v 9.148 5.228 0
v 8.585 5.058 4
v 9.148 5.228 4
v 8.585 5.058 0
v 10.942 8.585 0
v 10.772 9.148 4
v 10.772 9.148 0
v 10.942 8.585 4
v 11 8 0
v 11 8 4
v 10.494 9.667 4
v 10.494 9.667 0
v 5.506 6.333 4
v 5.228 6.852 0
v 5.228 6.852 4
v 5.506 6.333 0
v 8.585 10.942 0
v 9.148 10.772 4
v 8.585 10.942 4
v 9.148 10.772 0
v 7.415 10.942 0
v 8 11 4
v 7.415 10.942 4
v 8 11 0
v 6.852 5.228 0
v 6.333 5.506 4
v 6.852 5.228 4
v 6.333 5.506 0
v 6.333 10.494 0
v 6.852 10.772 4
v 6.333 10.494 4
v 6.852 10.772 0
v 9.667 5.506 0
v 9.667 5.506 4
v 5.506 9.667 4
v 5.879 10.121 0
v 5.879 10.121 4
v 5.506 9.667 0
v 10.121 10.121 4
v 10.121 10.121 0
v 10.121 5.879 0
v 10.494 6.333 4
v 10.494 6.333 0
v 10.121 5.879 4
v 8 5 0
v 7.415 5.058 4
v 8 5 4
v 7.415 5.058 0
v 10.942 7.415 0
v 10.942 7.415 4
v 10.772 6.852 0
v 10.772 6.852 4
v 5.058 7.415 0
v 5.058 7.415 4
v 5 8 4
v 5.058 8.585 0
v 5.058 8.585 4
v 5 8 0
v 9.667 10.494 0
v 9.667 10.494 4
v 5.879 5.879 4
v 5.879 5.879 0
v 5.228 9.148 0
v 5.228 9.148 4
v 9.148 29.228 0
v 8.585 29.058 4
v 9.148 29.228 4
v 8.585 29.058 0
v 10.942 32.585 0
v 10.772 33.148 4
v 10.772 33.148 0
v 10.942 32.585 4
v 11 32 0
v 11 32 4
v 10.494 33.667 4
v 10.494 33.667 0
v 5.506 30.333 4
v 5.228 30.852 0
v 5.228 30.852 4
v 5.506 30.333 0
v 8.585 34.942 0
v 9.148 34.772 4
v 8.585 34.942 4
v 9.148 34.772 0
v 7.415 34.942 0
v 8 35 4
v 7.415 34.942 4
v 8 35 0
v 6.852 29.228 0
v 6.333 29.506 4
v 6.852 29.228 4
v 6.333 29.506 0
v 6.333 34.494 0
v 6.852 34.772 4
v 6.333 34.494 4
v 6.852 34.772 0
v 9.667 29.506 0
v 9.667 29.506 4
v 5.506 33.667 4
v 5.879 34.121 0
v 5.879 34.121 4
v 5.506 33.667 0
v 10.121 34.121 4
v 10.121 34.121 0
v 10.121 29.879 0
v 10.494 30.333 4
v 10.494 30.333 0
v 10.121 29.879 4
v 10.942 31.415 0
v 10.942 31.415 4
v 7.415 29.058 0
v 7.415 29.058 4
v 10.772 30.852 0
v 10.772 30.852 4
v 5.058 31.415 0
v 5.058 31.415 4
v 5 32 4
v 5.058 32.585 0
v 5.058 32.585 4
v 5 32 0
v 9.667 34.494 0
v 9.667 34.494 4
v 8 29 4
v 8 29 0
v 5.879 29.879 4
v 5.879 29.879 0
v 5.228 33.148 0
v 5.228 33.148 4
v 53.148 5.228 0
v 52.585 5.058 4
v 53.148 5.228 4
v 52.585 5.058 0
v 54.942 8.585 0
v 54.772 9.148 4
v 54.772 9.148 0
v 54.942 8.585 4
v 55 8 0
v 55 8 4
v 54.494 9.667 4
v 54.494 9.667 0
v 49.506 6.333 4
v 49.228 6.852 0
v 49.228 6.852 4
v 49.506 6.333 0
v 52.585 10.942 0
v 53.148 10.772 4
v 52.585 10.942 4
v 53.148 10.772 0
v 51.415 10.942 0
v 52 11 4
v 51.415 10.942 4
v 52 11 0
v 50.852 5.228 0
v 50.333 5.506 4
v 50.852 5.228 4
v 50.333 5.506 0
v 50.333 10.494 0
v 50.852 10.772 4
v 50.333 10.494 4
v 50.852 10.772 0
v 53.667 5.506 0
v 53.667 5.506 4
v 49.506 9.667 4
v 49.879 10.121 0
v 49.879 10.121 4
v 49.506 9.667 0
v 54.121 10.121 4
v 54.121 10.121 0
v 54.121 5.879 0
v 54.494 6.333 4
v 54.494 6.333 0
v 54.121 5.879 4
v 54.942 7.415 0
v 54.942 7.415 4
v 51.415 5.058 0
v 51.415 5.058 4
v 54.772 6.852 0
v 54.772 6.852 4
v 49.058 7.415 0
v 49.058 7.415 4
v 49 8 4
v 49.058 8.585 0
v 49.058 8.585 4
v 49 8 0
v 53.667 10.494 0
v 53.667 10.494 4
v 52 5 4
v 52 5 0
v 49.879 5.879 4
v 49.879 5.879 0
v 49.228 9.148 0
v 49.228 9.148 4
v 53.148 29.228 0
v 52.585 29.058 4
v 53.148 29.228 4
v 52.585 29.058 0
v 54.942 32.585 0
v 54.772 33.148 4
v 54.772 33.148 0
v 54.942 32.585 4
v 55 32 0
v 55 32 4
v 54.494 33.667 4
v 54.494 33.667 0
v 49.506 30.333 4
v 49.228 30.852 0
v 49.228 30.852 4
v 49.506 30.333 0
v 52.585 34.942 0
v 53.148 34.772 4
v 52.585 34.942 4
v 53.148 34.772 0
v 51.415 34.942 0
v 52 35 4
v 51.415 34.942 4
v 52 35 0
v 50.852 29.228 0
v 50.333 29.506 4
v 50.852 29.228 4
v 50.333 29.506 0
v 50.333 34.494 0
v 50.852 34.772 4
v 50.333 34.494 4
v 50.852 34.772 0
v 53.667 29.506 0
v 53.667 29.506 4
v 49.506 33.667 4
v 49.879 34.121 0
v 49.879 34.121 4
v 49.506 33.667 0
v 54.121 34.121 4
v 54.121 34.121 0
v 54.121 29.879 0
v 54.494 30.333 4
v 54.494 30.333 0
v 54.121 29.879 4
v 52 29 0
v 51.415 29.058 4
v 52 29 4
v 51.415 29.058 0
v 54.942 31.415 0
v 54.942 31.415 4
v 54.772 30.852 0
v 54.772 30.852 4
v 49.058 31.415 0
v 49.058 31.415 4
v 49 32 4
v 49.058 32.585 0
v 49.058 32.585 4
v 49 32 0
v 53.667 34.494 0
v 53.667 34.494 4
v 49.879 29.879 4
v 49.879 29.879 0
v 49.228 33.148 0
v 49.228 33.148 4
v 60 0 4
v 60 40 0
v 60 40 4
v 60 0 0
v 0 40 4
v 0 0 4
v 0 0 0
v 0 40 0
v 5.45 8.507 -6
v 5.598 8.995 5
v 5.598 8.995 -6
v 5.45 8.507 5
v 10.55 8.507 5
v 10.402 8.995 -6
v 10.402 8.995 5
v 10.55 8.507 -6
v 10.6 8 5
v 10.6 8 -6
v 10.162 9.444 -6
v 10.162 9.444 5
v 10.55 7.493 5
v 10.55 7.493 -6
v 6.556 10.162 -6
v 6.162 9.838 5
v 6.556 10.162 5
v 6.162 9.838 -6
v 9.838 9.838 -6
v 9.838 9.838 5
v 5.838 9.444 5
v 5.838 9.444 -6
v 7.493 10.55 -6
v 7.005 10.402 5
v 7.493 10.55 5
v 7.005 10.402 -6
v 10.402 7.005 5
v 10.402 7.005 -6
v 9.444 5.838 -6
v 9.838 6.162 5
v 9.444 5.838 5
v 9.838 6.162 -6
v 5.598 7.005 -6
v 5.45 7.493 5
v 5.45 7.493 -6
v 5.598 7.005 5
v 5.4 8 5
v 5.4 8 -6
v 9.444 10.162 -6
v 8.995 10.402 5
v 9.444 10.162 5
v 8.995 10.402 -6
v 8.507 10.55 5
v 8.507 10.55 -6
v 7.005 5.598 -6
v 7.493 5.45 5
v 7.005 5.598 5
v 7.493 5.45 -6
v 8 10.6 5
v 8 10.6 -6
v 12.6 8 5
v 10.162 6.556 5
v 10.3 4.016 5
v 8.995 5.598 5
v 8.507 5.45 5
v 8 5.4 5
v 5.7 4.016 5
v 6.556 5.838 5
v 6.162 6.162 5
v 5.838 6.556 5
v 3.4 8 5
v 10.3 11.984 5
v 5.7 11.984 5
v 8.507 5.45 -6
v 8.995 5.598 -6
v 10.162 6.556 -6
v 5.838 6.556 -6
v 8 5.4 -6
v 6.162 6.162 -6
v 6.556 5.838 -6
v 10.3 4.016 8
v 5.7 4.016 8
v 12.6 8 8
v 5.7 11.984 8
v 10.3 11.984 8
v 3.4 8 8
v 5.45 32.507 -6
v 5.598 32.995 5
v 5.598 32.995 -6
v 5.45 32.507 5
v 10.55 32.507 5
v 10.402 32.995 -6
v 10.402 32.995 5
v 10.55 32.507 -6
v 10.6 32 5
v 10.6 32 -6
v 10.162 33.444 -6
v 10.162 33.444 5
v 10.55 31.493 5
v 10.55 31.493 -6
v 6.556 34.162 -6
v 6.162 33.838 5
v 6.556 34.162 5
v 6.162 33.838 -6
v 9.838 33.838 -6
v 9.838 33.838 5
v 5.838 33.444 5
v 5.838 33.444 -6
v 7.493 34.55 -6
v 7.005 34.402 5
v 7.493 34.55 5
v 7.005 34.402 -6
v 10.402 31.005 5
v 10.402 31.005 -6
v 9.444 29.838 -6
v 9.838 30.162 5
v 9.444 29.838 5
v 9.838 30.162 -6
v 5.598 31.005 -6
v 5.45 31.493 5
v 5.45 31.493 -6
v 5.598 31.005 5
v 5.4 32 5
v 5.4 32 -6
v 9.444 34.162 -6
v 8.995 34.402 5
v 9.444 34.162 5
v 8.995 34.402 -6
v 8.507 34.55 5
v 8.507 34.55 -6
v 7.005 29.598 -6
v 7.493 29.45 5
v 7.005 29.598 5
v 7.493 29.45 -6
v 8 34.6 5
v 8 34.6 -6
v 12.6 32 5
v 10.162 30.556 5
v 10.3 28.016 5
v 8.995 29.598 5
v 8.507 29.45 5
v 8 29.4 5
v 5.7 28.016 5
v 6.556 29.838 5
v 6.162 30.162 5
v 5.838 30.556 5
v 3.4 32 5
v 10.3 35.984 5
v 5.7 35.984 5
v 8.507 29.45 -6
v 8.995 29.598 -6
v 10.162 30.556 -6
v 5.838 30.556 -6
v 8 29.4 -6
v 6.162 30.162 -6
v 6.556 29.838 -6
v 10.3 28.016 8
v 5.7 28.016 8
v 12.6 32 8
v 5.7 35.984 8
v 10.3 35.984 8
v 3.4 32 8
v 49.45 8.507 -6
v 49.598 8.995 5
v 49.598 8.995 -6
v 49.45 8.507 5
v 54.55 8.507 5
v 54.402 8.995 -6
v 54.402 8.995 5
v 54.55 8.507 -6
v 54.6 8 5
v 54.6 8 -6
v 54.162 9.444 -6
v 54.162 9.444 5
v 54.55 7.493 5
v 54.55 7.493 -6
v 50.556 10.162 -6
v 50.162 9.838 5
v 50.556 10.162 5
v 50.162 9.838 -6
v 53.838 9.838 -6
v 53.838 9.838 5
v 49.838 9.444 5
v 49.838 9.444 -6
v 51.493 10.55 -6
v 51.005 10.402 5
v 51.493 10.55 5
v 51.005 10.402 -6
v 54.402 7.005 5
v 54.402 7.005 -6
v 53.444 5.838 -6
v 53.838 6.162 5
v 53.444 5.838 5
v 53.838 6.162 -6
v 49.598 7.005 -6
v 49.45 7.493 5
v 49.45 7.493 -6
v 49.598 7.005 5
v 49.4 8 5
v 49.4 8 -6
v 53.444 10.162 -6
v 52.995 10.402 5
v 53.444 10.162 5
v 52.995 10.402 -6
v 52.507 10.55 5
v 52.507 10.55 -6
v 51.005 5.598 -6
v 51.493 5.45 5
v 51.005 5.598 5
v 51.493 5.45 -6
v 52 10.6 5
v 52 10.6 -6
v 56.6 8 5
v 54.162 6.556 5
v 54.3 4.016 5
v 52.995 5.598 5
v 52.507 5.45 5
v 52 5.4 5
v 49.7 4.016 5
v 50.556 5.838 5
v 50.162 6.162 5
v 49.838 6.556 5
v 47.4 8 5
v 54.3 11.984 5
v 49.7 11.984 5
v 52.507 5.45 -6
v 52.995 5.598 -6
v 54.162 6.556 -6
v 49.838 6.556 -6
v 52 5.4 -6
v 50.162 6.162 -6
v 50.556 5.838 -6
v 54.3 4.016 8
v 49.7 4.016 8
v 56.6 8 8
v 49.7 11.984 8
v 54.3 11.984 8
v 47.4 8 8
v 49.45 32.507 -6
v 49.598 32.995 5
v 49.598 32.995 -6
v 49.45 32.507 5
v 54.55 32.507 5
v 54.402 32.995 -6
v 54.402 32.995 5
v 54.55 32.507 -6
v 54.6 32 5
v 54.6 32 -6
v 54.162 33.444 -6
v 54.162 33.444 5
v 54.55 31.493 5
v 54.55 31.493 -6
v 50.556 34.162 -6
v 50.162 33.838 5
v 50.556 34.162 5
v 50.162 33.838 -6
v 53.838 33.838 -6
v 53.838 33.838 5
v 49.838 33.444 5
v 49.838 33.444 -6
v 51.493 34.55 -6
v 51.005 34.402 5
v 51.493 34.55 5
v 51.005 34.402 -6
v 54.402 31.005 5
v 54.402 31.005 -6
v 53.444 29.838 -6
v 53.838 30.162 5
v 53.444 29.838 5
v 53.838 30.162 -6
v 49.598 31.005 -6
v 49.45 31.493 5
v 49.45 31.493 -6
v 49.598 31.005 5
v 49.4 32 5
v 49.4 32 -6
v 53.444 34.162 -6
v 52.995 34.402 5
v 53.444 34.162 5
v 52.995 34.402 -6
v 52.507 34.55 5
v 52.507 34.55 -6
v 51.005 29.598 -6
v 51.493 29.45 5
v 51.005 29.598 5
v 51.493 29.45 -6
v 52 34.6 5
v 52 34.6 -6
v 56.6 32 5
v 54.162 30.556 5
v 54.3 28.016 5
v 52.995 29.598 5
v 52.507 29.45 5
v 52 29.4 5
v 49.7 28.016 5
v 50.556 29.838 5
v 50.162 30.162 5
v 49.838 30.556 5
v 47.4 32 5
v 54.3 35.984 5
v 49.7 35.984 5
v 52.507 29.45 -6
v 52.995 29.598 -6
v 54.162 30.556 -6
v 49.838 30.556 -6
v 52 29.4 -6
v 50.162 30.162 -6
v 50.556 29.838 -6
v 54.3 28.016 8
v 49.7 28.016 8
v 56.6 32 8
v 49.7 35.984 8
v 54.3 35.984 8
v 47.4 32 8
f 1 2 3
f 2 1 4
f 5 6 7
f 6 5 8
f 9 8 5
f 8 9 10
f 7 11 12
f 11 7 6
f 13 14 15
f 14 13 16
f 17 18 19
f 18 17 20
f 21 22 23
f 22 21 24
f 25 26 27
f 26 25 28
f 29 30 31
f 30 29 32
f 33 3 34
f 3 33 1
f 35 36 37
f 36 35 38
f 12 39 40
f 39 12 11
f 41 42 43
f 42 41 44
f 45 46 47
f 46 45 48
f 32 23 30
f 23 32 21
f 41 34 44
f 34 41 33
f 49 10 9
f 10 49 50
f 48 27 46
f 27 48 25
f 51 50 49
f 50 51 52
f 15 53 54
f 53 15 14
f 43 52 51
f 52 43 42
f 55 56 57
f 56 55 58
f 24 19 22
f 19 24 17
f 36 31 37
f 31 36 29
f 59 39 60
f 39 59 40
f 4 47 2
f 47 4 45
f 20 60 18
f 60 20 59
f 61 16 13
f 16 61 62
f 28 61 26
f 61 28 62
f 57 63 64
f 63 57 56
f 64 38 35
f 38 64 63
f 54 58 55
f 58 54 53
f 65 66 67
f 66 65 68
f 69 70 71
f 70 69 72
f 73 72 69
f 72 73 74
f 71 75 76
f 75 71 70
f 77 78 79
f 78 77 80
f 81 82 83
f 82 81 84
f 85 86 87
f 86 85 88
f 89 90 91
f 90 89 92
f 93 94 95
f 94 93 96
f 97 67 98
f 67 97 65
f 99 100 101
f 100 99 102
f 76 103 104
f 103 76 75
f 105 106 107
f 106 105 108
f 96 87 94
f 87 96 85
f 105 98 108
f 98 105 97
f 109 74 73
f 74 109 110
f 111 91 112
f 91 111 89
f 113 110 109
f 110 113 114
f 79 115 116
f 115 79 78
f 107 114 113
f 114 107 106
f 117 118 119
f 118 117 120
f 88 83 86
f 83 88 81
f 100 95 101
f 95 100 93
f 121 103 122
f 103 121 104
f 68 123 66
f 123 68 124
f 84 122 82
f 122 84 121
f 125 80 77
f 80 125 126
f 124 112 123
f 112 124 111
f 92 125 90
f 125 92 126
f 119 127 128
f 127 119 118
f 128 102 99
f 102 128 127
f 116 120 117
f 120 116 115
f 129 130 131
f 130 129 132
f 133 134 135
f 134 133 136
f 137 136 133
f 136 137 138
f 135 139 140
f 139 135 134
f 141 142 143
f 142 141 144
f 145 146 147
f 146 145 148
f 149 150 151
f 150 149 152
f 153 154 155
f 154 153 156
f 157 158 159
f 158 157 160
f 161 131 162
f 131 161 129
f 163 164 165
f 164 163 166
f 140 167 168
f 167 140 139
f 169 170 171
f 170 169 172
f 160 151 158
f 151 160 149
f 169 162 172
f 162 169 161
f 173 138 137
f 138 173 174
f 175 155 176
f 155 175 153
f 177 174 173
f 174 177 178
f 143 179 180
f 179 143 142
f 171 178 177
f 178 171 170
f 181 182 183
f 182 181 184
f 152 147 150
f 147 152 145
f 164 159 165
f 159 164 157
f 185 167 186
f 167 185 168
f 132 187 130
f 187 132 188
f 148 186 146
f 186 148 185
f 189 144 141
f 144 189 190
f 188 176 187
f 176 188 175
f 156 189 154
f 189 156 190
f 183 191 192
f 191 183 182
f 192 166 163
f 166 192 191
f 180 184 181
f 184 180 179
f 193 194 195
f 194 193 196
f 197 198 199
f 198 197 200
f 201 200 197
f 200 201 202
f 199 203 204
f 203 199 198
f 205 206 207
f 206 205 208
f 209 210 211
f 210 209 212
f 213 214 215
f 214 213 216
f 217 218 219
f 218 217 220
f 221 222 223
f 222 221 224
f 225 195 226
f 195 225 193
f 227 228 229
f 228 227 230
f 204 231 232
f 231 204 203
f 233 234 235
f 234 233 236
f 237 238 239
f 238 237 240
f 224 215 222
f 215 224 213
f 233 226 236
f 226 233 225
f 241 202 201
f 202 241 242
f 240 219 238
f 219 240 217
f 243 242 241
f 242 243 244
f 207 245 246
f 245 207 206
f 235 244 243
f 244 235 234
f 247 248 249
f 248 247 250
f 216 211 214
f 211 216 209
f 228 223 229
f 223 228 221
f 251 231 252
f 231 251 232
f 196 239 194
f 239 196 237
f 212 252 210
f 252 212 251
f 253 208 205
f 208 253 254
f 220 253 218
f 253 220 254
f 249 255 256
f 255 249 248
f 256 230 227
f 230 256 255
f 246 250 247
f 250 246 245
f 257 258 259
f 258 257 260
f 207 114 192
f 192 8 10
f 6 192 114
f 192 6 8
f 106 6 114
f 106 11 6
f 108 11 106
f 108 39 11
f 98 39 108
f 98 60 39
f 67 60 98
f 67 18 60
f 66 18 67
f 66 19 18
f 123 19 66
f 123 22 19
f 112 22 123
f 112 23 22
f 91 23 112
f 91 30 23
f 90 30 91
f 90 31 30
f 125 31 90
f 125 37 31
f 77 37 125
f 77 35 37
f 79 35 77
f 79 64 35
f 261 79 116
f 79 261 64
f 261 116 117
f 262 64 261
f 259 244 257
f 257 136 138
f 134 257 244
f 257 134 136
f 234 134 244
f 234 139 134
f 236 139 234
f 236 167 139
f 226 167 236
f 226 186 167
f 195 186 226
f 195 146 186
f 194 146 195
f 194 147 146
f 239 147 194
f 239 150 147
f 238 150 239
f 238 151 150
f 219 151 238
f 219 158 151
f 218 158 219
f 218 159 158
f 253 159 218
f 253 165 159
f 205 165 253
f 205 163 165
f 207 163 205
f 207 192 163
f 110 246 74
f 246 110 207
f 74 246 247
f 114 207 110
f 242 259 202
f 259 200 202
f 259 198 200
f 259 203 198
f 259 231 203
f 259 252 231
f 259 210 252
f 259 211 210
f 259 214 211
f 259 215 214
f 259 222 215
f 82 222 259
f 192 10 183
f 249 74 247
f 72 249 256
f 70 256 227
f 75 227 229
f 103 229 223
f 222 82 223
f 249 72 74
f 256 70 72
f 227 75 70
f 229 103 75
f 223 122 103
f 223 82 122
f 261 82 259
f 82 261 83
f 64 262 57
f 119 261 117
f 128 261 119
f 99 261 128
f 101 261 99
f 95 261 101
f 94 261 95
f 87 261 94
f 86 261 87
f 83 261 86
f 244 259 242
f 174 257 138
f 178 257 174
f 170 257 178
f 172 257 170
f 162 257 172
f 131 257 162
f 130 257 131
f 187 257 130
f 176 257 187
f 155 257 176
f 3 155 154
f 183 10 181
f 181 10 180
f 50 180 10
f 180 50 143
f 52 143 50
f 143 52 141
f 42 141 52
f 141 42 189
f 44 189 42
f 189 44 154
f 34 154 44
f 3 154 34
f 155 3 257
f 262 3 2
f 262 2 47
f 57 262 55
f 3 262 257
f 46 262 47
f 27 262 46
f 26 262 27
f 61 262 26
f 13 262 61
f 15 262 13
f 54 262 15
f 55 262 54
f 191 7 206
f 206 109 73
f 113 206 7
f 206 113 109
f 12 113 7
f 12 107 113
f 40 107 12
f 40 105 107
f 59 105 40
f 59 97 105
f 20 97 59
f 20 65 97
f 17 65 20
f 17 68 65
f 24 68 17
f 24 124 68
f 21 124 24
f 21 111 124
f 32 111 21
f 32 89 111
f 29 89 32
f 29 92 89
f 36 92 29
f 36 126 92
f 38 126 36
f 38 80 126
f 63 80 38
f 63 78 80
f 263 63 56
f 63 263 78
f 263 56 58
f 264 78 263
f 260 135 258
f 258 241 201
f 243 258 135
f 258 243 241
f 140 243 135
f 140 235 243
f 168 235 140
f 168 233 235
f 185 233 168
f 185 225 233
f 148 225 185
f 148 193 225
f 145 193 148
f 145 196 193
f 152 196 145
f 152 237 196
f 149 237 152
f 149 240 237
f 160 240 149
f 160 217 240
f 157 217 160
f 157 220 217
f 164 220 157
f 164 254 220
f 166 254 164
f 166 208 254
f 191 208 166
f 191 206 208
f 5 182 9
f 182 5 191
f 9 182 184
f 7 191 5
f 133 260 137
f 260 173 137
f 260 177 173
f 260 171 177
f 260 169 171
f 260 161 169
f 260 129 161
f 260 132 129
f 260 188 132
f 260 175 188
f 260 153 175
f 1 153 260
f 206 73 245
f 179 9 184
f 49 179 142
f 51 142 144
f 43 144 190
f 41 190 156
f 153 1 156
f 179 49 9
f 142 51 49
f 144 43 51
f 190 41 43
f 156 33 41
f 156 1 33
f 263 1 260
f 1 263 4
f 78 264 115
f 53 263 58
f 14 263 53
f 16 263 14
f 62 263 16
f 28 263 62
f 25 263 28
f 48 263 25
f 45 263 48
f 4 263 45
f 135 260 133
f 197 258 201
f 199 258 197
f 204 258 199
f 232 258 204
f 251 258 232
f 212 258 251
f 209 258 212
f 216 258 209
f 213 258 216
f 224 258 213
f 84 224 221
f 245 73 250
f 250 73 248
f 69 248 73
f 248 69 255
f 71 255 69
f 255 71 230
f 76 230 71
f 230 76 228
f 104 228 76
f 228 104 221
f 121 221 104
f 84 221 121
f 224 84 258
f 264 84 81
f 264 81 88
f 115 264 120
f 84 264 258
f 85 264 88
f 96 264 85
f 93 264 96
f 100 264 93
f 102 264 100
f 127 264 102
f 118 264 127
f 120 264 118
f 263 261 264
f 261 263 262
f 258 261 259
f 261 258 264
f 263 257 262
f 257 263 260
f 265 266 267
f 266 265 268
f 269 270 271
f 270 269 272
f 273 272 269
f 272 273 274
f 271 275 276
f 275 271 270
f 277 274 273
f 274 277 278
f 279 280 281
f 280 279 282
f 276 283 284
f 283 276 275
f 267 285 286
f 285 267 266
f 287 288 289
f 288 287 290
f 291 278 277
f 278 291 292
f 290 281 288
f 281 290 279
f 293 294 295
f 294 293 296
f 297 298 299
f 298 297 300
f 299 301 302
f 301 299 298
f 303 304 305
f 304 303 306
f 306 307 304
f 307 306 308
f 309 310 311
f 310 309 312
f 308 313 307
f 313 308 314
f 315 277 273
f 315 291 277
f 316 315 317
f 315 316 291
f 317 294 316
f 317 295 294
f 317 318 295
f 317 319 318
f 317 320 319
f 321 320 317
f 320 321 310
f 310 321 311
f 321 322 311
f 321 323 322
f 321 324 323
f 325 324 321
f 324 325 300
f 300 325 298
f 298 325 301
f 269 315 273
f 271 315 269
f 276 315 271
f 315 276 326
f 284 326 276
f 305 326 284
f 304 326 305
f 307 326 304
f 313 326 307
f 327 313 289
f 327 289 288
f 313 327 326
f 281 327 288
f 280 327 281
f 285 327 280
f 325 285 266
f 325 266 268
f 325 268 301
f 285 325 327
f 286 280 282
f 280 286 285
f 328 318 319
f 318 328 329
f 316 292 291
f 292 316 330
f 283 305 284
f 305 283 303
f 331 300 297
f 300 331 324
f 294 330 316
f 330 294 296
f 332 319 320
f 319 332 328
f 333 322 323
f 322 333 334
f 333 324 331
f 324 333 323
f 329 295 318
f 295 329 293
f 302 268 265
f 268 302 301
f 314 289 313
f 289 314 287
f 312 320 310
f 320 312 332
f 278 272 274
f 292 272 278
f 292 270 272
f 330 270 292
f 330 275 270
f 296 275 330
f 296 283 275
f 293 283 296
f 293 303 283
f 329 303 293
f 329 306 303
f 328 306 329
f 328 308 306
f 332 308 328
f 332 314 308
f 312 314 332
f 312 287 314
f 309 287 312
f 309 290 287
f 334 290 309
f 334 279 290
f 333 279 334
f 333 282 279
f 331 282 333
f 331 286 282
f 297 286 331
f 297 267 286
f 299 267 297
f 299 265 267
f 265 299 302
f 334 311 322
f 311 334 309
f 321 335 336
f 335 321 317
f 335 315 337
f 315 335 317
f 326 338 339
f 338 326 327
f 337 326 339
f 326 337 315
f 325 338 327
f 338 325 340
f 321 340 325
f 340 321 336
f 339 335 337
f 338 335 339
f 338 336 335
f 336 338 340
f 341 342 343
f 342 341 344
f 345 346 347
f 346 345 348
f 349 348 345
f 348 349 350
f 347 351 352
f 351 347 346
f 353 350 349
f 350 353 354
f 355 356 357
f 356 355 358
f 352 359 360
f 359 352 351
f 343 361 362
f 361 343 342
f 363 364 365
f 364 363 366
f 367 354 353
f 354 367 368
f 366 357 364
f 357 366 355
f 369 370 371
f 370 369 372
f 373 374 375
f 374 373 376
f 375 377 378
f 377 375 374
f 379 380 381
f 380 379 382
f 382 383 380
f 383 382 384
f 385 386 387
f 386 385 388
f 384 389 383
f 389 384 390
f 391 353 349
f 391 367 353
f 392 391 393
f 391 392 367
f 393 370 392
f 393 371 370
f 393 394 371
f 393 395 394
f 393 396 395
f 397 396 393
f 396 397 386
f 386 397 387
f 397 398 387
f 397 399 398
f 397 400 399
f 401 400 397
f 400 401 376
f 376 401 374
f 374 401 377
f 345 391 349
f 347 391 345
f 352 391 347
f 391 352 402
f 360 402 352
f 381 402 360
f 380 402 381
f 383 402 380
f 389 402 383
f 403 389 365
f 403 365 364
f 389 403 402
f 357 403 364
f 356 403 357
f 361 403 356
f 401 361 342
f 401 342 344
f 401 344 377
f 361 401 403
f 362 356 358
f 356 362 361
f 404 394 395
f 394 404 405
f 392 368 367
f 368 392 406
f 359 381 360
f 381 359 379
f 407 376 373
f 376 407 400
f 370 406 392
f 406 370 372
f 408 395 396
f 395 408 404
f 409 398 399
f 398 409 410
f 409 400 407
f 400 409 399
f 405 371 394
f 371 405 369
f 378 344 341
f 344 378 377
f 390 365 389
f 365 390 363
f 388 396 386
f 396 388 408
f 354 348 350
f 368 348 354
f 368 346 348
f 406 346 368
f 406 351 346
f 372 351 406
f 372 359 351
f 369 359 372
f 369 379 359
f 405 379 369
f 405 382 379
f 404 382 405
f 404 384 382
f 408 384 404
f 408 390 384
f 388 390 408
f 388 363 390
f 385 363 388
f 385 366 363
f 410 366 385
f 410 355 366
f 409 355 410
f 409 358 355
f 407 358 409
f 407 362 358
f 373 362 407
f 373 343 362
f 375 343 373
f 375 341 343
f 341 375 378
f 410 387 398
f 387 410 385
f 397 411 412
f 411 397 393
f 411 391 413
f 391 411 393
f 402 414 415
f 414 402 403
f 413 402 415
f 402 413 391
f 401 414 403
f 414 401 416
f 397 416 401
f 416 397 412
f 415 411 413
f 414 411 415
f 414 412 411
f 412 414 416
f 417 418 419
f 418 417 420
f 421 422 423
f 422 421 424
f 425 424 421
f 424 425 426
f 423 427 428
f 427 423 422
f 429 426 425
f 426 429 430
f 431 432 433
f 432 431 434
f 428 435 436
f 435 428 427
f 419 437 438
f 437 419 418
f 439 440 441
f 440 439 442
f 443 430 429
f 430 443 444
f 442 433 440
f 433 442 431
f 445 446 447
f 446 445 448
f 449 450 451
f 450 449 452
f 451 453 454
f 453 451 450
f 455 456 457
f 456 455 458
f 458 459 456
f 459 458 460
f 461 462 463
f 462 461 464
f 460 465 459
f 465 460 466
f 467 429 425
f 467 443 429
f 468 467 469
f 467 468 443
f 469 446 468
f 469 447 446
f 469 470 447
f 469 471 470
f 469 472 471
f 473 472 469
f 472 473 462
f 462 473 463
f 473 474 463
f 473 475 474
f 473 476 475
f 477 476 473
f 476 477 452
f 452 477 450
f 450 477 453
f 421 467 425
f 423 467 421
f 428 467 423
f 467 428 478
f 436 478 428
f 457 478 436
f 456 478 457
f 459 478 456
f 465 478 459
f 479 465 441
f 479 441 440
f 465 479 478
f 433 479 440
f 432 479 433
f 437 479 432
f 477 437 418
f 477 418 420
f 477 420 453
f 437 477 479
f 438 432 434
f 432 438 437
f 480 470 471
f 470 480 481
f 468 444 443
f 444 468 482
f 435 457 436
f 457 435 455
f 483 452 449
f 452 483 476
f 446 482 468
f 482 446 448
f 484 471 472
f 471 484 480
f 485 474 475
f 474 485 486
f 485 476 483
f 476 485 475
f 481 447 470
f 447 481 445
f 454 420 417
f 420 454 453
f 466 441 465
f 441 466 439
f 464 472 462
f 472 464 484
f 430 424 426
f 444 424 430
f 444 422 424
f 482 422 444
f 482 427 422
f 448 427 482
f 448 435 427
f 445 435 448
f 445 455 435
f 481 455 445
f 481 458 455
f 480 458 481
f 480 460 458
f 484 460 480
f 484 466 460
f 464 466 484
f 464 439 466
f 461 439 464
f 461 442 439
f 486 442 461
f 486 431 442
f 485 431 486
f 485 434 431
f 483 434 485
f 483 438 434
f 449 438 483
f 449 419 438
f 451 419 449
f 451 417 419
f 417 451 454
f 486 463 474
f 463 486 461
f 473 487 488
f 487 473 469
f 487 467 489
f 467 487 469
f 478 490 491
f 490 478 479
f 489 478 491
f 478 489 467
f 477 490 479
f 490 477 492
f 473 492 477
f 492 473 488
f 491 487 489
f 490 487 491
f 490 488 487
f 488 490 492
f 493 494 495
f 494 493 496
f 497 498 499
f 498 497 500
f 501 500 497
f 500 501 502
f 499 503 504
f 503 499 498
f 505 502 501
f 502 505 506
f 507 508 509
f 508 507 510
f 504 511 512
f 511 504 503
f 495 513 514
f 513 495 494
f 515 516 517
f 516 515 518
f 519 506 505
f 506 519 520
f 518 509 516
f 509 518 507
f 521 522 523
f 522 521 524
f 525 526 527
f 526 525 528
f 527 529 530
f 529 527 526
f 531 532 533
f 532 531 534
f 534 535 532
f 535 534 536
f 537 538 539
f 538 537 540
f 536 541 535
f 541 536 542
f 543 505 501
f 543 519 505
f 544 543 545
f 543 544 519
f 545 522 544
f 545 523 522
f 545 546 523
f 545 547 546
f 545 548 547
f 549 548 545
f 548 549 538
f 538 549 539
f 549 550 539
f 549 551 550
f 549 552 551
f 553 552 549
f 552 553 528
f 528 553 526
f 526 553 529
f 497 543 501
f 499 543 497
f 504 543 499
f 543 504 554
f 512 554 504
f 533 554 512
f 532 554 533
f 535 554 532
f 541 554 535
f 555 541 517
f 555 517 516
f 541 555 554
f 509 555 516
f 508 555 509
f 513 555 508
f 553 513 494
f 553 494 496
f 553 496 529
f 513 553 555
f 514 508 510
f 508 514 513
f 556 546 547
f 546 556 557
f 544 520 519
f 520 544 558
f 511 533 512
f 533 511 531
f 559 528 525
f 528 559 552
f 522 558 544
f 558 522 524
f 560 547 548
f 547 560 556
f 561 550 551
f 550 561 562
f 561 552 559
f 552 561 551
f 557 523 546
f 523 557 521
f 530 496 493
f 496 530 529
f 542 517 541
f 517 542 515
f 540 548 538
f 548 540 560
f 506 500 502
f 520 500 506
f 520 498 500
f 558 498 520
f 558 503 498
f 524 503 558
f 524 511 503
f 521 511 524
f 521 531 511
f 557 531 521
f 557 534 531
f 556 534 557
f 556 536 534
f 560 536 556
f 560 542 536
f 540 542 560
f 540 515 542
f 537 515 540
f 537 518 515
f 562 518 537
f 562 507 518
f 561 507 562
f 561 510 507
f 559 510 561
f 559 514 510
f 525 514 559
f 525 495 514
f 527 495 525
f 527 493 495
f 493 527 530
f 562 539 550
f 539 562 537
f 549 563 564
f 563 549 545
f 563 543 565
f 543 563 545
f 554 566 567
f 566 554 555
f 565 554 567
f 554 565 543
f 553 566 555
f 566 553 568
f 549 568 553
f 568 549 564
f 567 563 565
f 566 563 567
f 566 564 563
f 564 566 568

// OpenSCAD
// file: parts/bolt.scad
module bolt() {
  cylinder(h = 11, r = 2.6, $fn = 32);
  translate([0, 0, 11]) cylinder(h = 3, r = 4.6, $fn = 6);
}
// file: parts/plate.scad
module plate(w = 60, d = 40, h = 4) {
  difference() {
    cube([w, d, h]);
    for (x = [8, w - 8], y = [8, d - 8])
      translate([x, y, -1]) cylinder(h = h + 2, r = 3, $fn = 32);
  }
}
// main file
use <parts/plate.scad>
use <parts/bolt.scad>

plate();
for (x = [8, 52], y = [8, 32])
  translate([x, y, -6]) color([0.72, 0.75, 0.8]) bolt();
